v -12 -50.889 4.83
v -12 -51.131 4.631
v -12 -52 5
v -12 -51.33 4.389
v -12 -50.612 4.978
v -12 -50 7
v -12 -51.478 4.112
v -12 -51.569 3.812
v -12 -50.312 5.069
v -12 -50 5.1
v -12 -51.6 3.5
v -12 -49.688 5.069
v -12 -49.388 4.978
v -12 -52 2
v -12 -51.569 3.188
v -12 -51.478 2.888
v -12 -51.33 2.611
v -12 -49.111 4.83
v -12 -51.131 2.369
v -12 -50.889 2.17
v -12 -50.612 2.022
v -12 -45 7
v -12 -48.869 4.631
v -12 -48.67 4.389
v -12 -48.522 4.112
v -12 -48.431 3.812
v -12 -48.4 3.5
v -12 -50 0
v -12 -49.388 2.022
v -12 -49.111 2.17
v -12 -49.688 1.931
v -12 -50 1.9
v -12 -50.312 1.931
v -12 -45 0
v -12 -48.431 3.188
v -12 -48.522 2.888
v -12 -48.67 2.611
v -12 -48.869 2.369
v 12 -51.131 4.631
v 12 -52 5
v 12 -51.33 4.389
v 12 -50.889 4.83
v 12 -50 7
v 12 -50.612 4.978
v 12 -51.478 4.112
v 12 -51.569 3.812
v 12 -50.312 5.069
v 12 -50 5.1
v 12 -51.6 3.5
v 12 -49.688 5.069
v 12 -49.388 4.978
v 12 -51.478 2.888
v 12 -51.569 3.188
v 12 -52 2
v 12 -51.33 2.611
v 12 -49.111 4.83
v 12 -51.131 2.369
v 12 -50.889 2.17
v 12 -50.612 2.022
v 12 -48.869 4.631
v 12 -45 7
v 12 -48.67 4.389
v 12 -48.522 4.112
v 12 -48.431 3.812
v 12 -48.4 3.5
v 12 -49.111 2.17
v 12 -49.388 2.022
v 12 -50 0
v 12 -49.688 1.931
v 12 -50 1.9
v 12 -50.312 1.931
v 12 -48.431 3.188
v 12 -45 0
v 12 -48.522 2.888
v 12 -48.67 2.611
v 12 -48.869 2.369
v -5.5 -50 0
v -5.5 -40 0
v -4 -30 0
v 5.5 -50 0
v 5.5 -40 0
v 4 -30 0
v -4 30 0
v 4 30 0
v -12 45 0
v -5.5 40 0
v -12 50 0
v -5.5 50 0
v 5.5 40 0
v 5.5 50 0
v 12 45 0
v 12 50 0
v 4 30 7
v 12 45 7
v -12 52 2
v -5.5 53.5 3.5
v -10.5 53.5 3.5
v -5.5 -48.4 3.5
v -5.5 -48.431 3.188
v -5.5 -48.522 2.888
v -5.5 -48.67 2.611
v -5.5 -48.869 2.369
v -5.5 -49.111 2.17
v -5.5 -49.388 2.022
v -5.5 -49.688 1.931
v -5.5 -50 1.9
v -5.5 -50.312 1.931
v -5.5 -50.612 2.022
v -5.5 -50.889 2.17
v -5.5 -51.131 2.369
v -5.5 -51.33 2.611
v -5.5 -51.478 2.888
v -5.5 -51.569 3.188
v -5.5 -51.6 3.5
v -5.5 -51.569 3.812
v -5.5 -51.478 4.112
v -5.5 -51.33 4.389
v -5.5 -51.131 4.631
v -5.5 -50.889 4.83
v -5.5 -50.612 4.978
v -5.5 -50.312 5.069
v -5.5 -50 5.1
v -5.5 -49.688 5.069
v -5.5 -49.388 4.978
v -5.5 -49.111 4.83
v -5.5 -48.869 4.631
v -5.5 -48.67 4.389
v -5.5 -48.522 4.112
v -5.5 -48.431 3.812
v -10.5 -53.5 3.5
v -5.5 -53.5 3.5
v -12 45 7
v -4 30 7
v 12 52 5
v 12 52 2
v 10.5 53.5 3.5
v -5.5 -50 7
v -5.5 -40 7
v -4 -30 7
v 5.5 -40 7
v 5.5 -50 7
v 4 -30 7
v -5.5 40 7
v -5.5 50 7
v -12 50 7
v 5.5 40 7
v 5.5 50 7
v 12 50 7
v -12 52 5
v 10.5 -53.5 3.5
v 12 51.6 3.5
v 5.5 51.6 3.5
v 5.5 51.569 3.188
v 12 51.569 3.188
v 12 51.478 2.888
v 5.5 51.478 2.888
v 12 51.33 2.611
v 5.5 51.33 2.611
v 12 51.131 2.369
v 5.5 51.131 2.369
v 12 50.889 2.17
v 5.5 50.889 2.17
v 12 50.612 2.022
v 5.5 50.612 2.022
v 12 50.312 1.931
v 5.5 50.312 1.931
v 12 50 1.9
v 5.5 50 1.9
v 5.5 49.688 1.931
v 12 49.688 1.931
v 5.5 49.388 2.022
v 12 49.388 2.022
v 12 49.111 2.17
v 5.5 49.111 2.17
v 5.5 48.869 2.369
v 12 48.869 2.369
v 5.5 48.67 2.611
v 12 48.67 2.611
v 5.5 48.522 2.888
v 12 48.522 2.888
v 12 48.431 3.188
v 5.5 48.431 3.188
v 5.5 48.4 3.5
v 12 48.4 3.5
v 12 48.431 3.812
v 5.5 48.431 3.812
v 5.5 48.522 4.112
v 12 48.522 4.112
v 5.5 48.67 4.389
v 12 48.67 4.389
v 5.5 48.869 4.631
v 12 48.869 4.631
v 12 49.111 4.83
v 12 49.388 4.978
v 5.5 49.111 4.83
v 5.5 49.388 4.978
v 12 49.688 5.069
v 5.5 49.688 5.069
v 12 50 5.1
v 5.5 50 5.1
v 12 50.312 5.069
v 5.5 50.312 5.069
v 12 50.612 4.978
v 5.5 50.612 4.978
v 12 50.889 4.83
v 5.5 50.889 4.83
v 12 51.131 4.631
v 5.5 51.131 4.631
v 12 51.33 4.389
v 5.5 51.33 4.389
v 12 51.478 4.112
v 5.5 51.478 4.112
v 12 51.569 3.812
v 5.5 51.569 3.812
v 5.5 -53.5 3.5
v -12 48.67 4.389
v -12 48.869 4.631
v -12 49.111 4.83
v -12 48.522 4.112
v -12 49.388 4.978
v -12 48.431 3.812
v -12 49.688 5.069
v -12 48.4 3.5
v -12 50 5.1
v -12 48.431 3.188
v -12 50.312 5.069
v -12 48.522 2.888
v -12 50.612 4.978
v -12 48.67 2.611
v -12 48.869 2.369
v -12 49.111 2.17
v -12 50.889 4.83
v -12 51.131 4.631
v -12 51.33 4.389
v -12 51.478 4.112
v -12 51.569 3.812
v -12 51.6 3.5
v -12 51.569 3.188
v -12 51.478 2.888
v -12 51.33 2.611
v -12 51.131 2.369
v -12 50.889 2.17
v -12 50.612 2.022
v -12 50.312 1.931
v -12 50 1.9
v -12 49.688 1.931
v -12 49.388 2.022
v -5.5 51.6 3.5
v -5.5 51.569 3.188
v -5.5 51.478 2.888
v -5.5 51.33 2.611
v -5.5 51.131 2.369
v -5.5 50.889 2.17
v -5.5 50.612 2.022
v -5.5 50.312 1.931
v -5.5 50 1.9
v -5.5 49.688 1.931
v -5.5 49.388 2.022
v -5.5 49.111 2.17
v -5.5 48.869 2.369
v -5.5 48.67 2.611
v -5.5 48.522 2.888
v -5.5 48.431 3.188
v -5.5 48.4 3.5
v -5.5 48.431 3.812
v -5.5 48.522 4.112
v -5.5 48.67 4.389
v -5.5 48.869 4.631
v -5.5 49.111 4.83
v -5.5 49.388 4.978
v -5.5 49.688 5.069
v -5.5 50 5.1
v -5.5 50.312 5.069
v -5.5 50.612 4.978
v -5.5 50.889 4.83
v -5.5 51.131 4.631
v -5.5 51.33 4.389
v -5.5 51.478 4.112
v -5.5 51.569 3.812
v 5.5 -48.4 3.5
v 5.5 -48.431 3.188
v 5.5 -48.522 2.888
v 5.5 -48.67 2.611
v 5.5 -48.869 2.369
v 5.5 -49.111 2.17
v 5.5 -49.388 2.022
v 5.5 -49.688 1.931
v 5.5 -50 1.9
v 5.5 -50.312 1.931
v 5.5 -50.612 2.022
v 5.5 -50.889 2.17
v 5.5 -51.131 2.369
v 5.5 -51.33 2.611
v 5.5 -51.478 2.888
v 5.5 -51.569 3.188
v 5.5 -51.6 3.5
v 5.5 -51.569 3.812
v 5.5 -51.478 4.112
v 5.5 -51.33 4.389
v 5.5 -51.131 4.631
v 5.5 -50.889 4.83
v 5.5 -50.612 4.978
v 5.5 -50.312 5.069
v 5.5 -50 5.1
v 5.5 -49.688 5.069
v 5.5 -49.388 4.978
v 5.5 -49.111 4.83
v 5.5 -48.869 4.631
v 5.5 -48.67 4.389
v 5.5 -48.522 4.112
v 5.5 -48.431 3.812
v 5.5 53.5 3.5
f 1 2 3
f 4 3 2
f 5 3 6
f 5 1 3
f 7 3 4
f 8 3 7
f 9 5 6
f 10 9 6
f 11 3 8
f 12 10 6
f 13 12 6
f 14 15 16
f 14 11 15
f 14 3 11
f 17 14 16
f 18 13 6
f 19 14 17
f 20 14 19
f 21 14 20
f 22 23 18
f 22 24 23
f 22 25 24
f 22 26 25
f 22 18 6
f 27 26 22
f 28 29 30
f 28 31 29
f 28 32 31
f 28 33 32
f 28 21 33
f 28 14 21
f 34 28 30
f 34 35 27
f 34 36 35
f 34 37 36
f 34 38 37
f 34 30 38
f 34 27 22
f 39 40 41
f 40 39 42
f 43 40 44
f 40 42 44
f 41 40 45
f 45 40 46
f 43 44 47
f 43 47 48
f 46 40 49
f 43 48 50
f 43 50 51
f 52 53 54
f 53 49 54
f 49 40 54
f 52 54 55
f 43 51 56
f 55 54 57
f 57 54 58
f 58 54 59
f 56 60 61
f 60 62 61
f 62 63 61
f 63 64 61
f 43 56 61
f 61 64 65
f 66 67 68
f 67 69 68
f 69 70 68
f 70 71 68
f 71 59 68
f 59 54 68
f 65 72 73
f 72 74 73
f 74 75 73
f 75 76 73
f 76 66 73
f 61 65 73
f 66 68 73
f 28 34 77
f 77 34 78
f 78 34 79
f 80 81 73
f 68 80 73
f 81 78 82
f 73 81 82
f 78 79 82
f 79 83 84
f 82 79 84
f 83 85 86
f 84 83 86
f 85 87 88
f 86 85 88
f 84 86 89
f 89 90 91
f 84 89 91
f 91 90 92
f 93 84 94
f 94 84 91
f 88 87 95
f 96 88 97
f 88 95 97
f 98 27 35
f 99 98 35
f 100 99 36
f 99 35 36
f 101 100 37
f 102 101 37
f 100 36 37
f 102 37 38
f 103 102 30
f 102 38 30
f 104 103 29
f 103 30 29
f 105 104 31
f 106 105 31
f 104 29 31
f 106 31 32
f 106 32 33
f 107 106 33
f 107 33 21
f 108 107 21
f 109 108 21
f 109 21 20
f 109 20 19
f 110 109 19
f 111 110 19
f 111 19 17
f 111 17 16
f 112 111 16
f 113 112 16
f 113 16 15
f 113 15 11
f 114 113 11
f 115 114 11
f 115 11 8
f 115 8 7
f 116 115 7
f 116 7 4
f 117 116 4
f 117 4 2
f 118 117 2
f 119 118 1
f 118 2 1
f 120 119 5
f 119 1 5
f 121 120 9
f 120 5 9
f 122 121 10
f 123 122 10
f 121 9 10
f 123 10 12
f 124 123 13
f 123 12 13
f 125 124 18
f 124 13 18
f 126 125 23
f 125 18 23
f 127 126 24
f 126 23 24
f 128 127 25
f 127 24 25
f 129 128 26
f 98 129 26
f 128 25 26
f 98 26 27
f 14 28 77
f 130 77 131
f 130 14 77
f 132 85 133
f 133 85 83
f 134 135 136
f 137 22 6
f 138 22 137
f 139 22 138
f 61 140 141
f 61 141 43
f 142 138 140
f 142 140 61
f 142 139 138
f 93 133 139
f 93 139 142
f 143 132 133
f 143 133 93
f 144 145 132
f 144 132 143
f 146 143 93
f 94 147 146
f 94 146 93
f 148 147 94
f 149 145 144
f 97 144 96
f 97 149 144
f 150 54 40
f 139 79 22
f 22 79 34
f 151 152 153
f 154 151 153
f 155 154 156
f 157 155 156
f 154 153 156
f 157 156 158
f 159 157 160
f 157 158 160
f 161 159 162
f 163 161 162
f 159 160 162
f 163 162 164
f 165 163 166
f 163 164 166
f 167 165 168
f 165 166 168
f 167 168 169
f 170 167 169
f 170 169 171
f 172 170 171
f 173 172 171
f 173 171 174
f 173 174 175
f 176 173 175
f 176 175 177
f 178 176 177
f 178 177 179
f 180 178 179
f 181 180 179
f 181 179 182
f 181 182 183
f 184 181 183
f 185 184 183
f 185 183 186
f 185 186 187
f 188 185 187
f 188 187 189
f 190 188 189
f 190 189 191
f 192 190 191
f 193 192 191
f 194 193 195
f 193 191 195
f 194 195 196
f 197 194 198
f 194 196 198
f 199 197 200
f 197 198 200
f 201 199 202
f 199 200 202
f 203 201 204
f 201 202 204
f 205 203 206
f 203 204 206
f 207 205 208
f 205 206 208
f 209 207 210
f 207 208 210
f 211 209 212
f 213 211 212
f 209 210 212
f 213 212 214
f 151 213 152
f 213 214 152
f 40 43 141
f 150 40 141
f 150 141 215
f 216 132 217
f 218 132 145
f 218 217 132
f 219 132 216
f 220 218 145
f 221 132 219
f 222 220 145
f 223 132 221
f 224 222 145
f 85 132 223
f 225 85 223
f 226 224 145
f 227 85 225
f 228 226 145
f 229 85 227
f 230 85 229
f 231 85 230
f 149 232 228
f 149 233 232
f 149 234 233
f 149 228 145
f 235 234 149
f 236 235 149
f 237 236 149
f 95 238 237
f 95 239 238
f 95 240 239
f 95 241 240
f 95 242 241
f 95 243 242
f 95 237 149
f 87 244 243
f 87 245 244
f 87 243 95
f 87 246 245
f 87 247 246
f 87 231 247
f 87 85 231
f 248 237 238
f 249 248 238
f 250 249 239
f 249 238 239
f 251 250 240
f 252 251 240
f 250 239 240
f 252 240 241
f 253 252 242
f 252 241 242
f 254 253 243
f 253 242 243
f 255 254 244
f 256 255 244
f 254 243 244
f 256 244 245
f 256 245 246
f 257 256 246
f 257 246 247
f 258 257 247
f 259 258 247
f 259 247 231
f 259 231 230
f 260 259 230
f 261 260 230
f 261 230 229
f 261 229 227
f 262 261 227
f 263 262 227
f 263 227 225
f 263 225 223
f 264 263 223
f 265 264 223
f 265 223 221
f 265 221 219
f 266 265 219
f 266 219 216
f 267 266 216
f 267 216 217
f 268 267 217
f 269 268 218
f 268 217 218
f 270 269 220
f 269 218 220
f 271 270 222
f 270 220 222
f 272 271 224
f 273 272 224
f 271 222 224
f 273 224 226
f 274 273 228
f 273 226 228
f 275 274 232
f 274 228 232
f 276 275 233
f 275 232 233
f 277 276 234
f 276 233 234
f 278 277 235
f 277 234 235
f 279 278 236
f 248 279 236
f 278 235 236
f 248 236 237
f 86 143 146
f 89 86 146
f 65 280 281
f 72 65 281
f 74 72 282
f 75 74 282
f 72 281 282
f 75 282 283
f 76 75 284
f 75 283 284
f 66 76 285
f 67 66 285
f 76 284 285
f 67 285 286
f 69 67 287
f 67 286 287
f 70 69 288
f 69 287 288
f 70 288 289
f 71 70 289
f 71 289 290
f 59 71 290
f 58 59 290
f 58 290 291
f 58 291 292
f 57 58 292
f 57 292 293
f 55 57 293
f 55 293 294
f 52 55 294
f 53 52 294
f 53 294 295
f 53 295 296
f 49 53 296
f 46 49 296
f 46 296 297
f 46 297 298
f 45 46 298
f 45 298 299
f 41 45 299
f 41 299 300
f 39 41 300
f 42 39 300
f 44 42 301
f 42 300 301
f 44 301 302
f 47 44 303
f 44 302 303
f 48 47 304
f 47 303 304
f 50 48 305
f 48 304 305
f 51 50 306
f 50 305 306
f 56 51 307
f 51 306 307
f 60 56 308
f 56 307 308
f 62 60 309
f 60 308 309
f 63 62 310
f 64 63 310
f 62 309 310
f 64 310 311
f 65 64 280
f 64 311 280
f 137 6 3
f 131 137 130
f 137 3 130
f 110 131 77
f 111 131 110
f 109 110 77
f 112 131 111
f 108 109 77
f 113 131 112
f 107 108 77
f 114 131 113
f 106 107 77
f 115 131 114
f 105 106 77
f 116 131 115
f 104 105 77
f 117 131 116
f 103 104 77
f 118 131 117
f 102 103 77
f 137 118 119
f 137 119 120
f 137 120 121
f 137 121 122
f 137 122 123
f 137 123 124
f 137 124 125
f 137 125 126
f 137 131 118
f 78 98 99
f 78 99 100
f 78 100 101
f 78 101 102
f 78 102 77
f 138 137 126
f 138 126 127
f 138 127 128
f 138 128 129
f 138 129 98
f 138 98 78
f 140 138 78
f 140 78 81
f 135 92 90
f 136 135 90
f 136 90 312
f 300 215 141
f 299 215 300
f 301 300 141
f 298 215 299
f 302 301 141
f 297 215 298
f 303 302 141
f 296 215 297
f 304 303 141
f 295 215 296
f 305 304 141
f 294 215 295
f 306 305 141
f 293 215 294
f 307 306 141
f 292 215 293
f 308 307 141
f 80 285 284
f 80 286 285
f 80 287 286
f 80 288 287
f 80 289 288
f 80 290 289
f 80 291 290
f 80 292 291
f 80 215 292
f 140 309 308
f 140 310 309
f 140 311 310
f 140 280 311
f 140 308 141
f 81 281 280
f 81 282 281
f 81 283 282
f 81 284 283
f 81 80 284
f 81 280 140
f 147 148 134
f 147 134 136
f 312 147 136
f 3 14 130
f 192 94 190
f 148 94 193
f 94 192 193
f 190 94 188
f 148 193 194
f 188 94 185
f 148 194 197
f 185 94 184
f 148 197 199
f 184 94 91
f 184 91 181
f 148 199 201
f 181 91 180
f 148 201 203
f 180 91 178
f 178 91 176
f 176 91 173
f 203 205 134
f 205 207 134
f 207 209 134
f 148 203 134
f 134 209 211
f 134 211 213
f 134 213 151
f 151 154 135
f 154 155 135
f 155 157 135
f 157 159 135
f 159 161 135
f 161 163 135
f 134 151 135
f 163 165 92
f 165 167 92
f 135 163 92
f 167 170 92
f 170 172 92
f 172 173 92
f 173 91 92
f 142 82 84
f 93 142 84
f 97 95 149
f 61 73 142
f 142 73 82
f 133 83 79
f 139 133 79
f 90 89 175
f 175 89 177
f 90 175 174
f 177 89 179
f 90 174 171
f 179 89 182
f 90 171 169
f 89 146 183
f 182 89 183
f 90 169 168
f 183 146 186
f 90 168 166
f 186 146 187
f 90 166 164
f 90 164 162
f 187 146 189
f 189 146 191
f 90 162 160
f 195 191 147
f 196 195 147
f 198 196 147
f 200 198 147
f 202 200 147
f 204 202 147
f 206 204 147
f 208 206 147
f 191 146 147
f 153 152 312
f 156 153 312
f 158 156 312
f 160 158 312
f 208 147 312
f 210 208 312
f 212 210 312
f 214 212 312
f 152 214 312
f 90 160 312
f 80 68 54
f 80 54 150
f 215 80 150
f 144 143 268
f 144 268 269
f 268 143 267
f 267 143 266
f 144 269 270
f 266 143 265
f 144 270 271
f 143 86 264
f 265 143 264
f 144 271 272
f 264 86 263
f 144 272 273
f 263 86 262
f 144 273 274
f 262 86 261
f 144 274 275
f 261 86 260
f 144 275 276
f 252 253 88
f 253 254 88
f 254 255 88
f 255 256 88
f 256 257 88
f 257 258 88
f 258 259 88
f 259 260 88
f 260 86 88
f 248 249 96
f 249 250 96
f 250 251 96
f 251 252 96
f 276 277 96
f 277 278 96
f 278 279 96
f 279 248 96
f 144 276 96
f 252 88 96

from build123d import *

# Parameters (mm, degrees)
F0_W        = 6.5
F0_H        = 10
F1_DEPTH    = 7
F3_DEPTH    = 25
F4_W        = 11
F4_H        = 5
F5_DEPTH    = 25
F6_SIZE     = 3
F7_T1_DEPTH = 29.2168298797
F7_T3_DEPTH = 29.2168298797


# Not quite as in the source:
# - a fillet or chamfer that OpenCascade refuses, or shapes differently, is made with other operations: its cross-section is extruded or revolved along the edge and cut away or added
# - a feature names something its author has since deleted; it is built from what else it names


with BuildPart() as f1:
    # F0 (on Top) → F1 (new body)
    with BuildSketch(Plane.XY):
        Polygon((0, 45), (-4, 45), (-4, 30), (0, 22.5), align=None)
        Polygon((4, 45), (0, 45), (0, 22.5), (4, 30), align=None)
        Polygon((-4, 30), (-4, 45), (-5.5, 45), (-12, 45), align=None)
        Polygon((0, -22.5), (-4, -30), (-4, -45), (0, -45), align=None)
        Polygon((4, -30), (0, -22.5), (0, -45), (4, -45), align=None)
        Polygon((12, -45), (4, -30), (4, -45), (5.5, -45), align=None)
        Polygon((-4, -45), (-4, -30), (-12, -45), (-5.5, -45), align=None)
        Polygon((5.5, 45), (4, 45), (4, 30), (12, 45), align=None)
        Polygon((0, 22.5), (-4, 30), (-4, -30), (0, -22.5), (0, 0), align=None)
        Polygon((4, 30), (0, 22.5), (0, 0), (0, -22.5), (4, -30), align=None)
        with Locations((8.75, 50)):
            Rectangle(F0_W, F0_H)
        with Locations((-8.75, 50)):
            Rectangle(F0_W, F0_H)
        with Locations((8.75, -50)):
            Rectangle(F0_W, F0_H)
        with Locations((-8.75, -50)):
            Rectangle(F0_W, F0_H)
    extrude(amount=F1_DEPTH)

    # F2 (on face) → F3 (cut)
    with BuildSketch(Plane(origin=(-12, 0, 0), x_dir=(0, -1, 0), z_dir=(-1, 0, 0))):
        with BuildLine():
            ThreePointArc((-48.4, 3.5), (-50, 5.1), (-51.6, 3.5))
            Line((-51.6, 3.5), (-50, 3.5))
            Line((-50, 3.5), (-48.4, 3.5))
        make_face()
        with BuildLine():
            Line((-50, 3.5), (-51.6, 3.5))
            ThreePointArc((-51.6, 3.5), (-50, 1.9), (-48.4, 3.5))
            Line((-48.4, 3.5), (-50, 3.5))
        make_face()
        with BuildLine():
            ThreePointArc((51.6, 3.5), (50, 5.1), (48.4, 3.5))
            ThreePointArc((48.4, 3.5), (50, 1.9), (51.6, 3.5))
        make_face()
    extrude(amount=-F3_DEPTH, mode=Mode.SUBTRACT)

    # F4 (on face) → F5 (cut)
    with BuildSketch(Plane.XY.offset(7)):
        with Locations((0, -42.5)):
            Rectangle(F4_W, F4_H)
        with Locations((0, 42.5)):
            Rectangle(F4_W, F4_H)
    extrude(amount=-F5_DEPTH, mode=Mode.SUBTRACT)

    # F6
    f6_edges = [f1.edges().sort_by_distance(p)[0] for p in [
        (12, -55, 3.5),
        (-12, -55, 3.5),
        (12, 55, 3.5),
        (-12, 55, 3.5),
    ]]
    chamfer(f6_edges, length=F6_SIZE)

    # F7: chamfer of 5 on 8 edges, made by hand

    # F7_s2 → F7_t1 (cut)
    with BuildSketch(Plane.YZ.offset(-21.8584149398)):
        Polygon((-50, 0), (-55, 5), (-55, 0), align=None)
        Polygon((-50, 7), (-55, 2), (-55, 7), align=None)
        Polygon((50, 7), (55, 2), (55, 7), align=None)
        Polygon((50, 0), (55, 5), (55, 0), align=None)
    extrude(amount=F7_T1_DEPTH, mode=Mode.SUBTRACT)

    # F7_s4 → F7_t3 (cut)
    with BuildSketch(Plane.YZ.offset(-7.3584149398)):
        Polygon((-55, 5), (-50, 0), (-55, 0), align=None)
        Polygon((-55, 2), (-50, 7), (-55, 7), align=None)
        Polygon((50, 7), (55, 2), (55, 7), align=None)
        Polygon((50, 0), (55, 5), (55, 0), align=None)
    extrude(amount=F7_T3_DEPTH, mode=Mode.SUBTRACT)


solid = f1.part
